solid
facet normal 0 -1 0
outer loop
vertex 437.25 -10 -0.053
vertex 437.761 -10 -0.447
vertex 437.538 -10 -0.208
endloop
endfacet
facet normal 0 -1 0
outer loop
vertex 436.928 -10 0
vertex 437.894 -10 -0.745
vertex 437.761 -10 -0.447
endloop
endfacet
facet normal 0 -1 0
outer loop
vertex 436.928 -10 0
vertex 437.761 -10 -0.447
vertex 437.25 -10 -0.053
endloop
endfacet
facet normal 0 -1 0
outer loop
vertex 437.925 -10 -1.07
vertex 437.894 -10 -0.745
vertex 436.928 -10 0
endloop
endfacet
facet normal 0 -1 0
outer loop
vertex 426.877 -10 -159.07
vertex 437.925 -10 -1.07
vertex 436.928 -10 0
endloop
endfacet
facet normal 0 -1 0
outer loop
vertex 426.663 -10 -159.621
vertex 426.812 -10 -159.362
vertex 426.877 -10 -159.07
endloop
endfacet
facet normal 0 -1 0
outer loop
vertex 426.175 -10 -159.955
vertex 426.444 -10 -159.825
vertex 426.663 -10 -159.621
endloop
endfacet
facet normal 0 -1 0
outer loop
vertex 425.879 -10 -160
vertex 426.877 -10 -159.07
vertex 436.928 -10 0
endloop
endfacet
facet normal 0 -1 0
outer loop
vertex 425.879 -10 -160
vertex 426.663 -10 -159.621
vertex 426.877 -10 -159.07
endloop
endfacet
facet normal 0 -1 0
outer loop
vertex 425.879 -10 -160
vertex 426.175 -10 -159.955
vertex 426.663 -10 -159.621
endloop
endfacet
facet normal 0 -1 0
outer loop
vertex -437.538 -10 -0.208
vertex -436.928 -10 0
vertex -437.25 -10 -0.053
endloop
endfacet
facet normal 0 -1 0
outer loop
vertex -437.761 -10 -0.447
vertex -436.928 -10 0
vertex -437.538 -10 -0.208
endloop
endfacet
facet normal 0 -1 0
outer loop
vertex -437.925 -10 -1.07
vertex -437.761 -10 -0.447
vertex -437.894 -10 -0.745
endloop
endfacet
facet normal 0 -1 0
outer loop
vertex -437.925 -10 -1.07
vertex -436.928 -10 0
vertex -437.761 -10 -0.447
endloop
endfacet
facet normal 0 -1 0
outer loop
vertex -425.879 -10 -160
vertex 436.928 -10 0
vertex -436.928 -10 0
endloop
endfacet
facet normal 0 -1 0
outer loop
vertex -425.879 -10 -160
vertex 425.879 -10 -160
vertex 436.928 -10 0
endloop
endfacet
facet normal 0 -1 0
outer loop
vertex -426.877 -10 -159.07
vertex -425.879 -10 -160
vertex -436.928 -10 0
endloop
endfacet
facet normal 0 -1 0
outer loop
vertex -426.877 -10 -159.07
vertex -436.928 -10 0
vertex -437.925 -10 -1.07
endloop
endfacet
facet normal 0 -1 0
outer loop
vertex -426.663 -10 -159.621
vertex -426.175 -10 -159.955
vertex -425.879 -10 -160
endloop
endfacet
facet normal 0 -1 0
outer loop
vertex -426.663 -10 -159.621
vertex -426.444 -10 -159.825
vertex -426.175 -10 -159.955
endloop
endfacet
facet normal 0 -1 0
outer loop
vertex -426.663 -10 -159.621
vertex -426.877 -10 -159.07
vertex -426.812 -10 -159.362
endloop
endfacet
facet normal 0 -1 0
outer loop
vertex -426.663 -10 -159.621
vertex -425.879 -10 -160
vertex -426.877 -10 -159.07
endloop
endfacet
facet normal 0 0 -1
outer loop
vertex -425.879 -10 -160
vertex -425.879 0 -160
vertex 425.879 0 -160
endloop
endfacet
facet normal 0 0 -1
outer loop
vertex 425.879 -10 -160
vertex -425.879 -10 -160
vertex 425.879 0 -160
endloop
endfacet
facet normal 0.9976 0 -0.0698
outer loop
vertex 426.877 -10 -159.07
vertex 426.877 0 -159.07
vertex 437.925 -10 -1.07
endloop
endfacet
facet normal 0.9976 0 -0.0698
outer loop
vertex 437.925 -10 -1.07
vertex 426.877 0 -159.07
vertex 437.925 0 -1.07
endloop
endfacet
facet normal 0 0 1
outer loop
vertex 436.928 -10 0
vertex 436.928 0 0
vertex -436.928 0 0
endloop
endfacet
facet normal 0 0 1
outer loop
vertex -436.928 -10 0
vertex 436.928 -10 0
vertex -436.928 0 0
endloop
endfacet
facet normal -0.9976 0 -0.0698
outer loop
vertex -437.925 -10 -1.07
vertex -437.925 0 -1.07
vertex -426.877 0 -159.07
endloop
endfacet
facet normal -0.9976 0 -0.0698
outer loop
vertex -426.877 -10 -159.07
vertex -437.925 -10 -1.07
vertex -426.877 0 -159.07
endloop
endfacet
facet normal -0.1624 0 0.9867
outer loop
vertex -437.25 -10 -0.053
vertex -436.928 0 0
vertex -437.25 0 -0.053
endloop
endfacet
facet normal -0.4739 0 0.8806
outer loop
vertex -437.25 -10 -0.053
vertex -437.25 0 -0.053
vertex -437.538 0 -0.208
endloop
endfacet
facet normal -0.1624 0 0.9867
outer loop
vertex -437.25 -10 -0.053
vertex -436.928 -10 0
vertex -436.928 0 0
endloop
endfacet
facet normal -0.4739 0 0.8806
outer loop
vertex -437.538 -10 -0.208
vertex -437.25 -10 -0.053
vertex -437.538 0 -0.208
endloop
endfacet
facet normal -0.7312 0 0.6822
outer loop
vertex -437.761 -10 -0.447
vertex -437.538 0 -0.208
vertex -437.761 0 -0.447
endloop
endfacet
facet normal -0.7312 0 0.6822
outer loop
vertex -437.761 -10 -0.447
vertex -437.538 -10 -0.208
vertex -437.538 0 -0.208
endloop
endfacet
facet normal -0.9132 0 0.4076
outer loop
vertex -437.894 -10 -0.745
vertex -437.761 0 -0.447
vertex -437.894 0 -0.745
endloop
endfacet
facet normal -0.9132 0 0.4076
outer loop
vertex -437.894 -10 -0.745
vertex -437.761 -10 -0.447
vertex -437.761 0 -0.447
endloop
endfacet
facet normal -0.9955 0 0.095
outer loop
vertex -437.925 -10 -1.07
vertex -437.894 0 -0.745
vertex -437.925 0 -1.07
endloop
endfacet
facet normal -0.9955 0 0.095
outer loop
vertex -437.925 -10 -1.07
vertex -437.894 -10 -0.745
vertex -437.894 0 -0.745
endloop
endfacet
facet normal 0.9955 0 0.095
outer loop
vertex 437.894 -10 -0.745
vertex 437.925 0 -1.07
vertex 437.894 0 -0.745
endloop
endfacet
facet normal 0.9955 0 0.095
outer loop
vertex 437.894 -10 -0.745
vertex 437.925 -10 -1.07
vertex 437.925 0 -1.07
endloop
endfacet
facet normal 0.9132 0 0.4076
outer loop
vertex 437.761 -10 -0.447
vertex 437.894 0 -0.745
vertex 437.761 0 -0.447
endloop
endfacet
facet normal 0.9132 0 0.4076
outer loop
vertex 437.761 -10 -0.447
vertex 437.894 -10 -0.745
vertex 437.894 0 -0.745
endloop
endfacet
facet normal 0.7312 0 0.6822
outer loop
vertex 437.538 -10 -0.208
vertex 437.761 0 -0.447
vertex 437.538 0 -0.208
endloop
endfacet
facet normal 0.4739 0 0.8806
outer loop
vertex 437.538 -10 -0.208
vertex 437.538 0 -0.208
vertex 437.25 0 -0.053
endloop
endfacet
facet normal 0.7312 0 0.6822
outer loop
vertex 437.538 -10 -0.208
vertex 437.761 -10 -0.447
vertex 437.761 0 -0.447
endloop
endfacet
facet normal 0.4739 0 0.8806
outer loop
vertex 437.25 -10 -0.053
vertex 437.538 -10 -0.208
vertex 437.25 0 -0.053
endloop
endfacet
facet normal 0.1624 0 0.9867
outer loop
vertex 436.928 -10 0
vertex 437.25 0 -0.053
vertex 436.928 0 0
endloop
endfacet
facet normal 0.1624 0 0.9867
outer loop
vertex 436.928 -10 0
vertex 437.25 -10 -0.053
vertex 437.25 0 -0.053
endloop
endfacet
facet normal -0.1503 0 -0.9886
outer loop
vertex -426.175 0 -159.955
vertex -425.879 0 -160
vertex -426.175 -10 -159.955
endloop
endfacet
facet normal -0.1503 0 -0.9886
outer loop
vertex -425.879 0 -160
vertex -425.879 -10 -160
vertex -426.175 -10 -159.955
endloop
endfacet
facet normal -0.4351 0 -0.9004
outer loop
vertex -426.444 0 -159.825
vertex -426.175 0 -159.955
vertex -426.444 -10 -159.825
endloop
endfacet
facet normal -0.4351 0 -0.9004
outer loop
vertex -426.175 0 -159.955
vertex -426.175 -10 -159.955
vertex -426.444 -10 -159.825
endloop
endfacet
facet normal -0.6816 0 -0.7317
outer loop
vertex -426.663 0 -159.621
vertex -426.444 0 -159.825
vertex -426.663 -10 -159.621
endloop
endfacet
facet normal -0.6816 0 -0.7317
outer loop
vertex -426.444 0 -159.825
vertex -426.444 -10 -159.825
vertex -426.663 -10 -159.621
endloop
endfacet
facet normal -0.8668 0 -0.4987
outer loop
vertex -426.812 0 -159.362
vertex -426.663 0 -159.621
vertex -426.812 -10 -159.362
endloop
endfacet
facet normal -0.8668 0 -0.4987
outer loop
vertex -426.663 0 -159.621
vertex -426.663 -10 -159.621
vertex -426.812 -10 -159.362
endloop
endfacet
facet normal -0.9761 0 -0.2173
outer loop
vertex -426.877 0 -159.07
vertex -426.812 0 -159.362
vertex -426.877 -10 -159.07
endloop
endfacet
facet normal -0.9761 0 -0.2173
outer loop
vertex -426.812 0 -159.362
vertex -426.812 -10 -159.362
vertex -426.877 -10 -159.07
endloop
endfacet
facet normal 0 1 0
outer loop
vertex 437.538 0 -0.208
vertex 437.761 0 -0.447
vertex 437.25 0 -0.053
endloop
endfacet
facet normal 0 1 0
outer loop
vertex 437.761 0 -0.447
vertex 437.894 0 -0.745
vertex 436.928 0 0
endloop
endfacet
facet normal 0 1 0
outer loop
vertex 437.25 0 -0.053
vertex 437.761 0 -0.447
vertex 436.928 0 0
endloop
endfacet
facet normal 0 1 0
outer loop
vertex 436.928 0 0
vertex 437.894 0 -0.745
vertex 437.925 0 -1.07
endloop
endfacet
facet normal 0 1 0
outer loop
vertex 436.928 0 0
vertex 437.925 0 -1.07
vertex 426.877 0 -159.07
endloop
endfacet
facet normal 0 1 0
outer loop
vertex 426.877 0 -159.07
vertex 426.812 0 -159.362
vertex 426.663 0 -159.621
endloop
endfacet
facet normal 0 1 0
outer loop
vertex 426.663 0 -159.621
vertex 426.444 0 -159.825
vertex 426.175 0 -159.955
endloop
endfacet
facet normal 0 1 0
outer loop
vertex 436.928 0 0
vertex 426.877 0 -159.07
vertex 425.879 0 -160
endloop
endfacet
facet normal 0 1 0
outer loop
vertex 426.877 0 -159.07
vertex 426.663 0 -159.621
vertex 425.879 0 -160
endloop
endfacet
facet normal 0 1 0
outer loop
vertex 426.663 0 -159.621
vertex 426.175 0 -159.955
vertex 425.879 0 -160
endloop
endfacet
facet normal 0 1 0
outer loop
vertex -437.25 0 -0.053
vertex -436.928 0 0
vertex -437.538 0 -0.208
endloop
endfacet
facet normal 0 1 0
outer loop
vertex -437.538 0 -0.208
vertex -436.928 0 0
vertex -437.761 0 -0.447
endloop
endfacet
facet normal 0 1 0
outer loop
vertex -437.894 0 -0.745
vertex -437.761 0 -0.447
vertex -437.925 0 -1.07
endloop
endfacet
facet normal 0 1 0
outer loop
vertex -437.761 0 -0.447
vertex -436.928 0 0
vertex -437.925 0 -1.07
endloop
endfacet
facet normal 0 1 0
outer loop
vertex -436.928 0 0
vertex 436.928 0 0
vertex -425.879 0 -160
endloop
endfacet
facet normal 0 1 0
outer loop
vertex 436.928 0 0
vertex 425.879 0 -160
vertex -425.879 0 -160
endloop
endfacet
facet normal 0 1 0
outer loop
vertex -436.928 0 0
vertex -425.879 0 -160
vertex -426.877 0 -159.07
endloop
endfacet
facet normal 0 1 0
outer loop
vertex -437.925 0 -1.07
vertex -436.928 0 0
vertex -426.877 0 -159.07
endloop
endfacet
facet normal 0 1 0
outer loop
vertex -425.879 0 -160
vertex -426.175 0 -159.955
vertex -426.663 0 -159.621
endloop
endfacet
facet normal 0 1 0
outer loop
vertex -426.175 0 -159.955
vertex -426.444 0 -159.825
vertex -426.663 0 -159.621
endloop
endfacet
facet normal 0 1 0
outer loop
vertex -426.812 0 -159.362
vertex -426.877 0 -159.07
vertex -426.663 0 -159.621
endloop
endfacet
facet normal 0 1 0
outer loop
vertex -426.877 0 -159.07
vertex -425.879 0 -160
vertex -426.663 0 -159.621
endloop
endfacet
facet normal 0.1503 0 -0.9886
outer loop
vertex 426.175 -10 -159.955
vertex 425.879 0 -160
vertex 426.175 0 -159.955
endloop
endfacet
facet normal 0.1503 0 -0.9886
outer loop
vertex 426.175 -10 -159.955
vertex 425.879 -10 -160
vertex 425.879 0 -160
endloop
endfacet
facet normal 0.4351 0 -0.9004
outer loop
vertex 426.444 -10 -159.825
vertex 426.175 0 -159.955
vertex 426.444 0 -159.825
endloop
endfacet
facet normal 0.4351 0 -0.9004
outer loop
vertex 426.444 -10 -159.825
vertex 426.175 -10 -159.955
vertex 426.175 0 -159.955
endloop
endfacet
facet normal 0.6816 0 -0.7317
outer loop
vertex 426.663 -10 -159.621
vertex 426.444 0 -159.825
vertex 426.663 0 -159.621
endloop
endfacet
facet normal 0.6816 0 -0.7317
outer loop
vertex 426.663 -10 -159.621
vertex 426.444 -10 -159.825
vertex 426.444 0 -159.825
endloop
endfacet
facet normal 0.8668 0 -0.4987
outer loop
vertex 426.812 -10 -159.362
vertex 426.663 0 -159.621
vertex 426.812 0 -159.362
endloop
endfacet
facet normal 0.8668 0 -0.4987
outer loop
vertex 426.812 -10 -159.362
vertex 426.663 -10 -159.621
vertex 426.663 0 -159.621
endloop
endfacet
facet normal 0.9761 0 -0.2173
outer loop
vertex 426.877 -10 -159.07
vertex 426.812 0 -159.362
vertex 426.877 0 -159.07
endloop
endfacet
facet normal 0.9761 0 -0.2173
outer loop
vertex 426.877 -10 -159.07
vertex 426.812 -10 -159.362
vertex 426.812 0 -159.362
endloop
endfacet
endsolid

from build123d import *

# Parameters (mm, degrees)
BASE_FLANGE1_DEPTH = 10
FILLET_1_0_R       = 1


# Sheet-metal steps are written as plain solids
with BuildPart() as part:
    # Sketch1 → Base-Flange1 (new body)
    with BuildSketch(Plane(origin=(0, 0, 0), x_dir=(1, 0, 0), z_dir=(0, 1, 0))):
        Polygon((-426.811710089, 160), (426.811710089, 160), (438, 0), (-438, 0), align=None)
    extrude(amount=-BASE_FLANGE1_DEPTH)

    # Fillet-1.0
    fillet_1_0_edges = [part.edges().sort_by_distance(p)[0] for p in [
        (-426.811710089, -5, -160),
        (426.811710089, -5, -160),
        (438, -5, 0),
        (-438, -5, 0),
    ]]
    fillet(fillet_1_0_edges, radius=FILLET_1_0_R)


solid = part.part
